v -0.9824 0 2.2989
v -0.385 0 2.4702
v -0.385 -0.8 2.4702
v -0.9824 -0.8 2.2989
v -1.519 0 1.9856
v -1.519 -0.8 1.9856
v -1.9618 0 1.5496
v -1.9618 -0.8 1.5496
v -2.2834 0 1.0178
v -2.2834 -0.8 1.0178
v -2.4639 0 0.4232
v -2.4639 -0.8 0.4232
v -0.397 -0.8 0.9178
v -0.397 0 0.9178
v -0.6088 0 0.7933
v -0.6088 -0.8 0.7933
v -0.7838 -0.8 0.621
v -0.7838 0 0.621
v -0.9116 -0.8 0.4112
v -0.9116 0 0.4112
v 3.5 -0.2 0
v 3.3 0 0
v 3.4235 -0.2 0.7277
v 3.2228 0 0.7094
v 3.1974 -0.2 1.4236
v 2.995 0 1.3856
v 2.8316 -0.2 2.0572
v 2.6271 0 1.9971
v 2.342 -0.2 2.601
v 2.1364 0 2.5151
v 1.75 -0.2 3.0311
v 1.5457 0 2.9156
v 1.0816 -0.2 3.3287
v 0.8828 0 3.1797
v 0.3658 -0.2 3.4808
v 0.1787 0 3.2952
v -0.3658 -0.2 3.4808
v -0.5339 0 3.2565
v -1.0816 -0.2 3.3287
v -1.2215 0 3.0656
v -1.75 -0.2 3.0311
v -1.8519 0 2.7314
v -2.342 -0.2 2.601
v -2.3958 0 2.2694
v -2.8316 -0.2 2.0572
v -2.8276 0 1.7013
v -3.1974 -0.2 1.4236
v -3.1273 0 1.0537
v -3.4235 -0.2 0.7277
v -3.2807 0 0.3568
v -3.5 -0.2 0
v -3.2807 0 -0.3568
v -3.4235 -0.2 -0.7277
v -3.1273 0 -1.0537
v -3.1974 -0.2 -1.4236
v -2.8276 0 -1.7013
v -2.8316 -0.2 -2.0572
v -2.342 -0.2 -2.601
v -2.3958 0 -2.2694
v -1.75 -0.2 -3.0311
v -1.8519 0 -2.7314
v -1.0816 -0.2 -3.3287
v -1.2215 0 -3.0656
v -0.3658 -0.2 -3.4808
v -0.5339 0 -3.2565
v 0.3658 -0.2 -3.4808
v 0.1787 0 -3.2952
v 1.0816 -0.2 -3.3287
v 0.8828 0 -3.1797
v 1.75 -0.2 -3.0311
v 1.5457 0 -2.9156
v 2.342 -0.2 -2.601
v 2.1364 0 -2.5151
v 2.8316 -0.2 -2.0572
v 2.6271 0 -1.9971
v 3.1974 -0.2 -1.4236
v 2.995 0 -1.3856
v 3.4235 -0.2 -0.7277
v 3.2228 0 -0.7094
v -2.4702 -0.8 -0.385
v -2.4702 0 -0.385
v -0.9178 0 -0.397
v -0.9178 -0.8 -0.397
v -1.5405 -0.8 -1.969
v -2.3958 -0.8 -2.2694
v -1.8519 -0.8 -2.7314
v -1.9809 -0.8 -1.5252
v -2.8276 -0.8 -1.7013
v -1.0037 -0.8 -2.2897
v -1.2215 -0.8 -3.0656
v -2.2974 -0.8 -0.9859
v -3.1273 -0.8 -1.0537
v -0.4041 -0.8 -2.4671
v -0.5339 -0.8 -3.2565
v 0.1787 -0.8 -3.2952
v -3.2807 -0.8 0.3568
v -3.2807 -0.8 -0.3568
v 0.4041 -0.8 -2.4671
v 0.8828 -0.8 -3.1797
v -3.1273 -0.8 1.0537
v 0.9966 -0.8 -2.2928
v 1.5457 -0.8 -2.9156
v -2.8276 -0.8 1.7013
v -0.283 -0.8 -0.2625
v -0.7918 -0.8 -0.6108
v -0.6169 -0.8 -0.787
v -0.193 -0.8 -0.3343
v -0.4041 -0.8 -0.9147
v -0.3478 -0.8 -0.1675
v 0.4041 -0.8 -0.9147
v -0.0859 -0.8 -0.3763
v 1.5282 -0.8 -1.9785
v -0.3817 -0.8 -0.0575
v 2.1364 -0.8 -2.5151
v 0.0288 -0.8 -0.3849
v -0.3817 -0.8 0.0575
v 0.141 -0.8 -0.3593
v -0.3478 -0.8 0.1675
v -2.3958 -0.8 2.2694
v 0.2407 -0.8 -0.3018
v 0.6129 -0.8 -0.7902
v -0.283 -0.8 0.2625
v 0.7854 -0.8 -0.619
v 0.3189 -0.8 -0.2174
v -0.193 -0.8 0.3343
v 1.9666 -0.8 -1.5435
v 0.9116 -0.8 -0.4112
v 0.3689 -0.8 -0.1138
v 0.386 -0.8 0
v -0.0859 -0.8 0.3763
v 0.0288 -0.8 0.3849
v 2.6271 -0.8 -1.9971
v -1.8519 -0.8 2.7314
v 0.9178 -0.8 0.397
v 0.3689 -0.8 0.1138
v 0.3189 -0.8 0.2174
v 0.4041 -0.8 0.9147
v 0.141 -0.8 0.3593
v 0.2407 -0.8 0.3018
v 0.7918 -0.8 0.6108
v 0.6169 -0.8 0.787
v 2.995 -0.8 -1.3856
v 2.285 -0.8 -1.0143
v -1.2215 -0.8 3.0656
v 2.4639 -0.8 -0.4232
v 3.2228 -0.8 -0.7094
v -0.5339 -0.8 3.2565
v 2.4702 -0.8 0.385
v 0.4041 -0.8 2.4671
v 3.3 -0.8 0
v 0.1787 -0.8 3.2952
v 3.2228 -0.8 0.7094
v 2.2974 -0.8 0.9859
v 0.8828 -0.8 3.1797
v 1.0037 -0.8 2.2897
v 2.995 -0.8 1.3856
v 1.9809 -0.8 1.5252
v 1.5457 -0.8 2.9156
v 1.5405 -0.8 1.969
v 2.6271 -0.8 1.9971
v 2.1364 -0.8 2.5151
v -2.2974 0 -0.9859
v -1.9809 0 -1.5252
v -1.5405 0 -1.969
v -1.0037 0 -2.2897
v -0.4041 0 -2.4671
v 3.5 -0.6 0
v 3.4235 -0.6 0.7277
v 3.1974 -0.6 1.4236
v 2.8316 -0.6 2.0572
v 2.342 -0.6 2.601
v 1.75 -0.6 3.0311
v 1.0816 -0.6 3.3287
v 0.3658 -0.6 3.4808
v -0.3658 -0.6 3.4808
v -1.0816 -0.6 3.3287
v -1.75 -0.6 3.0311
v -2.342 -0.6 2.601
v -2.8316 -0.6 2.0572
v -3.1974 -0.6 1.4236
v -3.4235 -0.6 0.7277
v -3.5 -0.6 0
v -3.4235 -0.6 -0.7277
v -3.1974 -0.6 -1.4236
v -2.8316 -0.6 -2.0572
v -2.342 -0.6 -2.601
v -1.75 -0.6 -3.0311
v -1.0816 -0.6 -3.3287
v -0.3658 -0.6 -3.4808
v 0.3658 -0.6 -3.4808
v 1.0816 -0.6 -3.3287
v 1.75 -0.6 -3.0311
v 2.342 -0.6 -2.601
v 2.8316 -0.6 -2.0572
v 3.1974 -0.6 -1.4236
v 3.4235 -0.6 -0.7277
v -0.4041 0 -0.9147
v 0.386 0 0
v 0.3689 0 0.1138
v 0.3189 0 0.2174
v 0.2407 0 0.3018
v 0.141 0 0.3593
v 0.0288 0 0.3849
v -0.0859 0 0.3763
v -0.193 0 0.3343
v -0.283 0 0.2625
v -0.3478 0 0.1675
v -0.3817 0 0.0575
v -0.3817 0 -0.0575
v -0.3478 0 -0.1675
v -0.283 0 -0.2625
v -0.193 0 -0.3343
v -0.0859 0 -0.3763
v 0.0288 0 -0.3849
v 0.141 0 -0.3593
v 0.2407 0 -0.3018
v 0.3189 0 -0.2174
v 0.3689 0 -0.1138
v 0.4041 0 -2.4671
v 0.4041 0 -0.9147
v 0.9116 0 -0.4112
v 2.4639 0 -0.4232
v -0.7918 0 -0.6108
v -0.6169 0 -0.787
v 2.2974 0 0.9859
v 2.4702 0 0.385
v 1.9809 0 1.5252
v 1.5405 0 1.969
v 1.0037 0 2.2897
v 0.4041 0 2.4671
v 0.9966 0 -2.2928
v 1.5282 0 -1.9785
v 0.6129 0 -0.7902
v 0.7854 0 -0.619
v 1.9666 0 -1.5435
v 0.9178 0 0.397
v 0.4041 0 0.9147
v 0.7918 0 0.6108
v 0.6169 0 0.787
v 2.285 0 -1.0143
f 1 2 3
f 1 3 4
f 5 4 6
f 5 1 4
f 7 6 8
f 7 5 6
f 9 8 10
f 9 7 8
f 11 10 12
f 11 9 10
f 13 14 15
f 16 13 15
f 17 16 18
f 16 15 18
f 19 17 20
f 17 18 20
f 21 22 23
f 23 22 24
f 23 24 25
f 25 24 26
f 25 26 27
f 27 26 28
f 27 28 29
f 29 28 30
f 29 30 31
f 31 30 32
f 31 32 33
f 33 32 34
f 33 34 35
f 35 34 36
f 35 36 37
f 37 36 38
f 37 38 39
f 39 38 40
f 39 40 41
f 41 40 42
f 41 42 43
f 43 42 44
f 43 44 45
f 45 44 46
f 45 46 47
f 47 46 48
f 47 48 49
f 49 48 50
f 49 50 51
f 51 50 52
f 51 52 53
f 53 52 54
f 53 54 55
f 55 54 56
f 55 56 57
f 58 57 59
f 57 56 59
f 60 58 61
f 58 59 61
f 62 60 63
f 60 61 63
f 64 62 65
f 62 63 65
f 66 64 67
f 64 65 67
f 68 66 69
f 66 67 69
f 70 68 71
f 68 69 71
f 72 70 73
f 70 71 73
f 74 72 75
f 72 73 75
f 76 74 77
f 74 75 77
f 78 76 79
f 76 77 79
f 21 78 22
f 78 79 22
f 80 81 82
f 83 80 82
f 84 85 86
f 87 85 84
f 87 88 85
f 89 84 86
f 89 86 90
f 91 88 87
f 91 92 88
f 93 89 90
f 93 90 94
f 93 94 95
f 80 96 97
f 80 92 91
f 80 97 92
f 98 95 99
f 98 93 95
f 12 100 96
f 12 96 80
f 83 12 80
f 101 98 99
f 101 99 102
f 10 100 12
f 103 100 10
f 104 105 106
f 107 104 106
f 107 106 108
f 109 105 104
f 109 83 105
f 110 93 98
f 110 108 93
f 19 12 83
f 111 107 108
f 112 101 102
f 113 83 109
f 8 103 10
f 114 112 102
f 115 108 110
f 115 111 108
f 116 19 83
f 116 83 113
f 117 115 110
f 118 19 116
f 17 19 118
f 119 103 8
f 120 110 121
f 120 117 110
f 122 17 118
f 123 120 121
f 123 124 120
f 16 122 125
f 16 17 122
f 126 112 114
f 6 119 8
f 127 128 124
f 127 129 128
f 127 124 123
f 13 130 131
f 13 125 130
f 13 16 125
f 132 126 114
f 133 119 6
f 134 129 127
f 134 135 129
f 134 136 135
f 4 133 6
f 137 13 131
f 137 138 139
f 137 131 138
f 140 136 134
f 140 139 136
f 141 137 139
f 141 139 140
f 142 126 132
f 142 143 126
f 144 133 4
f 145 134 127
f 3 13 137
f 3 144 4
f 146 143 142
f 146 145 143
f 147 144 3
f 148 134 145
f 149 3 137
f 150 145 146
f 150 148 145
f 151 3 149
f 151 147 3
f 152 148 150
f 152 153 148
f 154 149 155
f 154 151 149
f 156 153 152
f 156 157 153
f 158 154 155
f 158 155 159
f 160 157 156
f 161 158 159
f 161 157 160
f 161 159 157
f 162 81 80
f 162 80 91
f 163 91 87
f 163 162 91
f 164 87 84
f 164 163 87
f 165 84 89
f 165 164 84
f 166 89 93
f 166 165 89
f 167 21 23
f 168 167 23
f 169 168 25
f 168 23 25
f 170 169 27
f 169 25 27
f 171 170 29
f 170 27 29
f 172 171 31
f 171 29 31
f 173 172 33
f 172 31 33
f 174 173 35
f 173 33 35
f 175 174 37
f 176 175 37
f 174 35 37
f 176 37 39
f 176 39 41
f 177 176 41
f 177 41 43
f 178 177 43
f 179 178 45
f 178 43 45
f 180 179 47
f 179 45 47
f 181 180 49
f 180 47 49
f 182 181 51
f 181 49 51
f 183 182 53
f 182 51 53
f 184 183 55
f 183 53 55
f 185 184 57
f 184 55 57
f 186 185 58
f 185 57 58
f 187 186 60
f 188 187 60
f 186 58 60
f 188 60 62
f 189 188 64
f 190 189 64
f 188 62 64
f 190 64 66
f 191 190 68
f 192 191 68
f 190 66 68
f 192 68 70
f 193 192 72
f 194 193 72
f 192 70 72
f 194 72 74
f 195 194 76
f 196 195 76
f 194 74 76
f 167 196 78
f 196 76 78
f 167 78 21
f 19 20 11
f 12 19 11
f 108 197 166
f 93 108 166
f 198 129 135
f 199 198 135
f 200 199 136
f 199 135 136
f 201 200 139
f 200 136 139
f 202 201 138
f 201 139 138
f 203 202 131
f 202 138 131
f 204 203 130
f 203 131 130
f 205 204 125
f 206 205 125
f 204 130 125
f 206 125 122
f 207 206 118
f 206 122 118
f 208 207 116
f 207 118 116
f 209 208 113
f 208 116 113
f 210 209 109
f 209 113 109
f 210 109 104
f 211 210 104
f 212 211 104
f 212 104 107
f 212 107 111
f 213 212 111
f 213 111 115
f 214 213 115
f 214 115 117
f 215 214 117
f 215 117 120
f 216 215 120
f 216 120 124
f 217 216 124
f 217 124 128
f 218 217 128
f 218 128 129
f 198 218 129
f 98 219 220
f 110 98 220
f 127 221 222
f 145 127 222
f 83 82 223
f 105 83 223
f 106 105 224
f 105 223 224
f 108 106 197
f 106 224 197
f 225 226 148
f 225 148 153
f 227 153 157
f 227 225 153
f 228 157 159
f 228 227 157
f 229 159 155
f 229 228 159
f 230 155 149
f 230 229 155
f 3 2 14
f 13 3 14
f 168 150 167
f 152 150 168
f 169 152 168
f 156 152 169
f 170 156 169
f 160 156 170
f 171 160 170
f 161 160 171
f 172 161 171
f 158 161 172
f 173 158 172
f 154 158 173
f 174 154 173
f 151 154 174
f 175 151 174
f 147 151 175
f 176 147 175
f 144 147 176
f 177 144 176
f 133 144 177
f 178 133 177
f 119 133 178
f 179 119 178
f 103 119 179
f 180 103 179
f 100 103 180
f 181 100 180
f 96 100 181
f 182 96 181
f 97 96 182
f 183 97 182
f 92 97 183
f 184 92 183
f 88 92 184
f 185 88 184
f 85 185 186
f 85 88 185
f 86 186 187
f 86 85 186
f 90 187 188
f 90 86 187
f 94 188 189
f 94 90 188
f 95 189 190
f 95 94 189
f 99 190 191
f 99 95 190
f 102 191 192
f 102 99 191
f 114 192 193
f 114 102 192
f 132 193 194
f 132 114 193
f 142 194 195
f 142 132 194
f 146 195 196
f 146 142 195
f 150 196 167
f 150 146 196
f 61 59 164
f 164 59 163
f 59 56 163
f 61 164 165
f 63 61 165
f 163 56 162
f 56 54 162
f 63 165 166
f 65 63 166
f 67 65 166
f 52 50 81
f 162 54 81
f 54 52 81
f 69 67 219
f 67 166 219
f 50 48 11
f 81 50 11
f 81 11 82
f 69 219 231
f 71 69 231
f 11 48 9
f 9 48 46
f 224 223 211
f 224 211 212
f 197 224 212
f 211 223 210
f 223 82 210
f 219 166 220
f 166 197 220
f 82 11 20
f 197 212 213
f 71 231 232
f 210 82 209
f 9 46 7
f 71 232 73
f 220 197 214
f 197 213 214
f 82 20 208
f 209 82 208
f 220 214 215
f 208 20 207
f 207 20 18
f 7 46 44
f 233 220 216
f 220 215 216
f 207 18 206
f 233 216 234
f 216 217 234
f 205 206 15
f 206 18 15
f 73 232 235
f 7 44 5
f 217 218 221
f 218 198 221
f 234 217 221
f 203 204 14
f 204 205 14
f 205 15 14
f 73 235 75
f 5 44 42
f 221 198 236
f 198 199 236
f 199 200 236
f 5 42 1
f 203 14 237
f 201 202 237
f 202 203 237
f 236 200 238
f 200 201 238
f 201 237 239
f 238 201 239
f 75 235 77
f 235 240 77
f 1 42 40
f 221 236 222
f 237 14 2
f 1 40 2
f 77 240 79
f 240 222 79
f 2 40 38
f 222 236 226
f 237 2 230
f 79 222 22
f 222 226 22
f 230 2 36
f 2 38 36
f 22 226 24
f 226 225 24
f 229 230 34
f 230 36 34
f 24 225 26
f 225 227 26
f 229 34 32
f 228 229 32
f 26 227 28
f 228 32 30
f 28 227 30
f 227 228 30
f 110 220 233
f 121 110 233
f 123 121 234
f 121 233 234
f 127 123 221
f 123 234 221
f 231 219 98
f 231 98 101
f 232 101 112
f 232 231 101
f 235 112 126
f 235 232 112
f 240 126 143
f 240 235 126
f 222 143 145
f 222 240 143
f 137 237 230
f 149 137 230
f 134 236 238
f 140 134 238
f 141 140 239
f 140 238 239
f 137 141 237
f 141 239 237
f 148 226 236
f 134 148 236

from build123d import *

# Parameters (mm, degrees)
F0_R     = 3.5
F0_R_2   = 2.5
F1_DEPTH = 0.8
F2_SIZE  = 0.2
F4_DEPTH = 0.8
F6_R     = 0.386
F7_DEPTH = 25


with BuildPart() as f1:
    # F0 (on Front) → F1 (new body)
    with BuildSketch(Plane.XZ):
        Circle(F0_R)
        Circle(F0_R_2, mode=Mode.SUBTRACT)
    extrude(amount=F1_DEPTH)

    # F2
    f2_edges = [f1.edges().sort_by_distance(p)[0] for p in [
        (3.5, -0.4, 0),
        (-3.5, 0, 0),
        (-3.5, -0.8, 0),
    ]]
    chamfer(f2_edges, length=F2_SIZE)

    # F3 (on Front) → F4 (join)
    with BuildSketch(Plane.XZ):
        with BuildLine():
            Line((0.4040931107, -2.4671256064), (0.4040931107, -0.914717857))
            ThreePointArc((0.4040931107, -0.914717857), (0.7043653121, -0.7098376625), (0.9115631819, -0.411160024))
            Line((0.9115631819, -0.411160024), (2.463924442, -0.4231741297))
            ThreePointArc((2.463924442, -0.4231741297), (2.4909647835, -0.2123545325), (2.5, 0))
            ThreePointArc((2.5, 0), (2.4925336023, 0.1930705612), (2.4701790067, 0.3849878892))
            Line((2.4701790067, 0.3849878892), (0.9178177466, 0.3970019949))
            ThreePointArc((0.9178177466, 0.3970019949), (0.7098376625, 0.7043653121), (0.4040931107, 0.914717857))
            Line((0.4040931107, 0.914717857), (0.4040931107, 2.4671256064))
            ThreePointArc((0.4040931107, 2.4671256064), (0.0096738403, 2.4999812833), (-0.3849878892, 2.4701790067))
            Line((-0.3849878892, 2.4701790067), (-0.3970019949, 0.9178177466))
            ThreePointArc((-0.3970019949, 0.9178177466), (-0.7016132963, 0.7125579152), (-0.9115631819, 0.411160024))
            Line((-0.9115631819, 0.411160024), (-2.463924442, 0.4231741297))
            ThreePointArc((-2.463924442, 0.4231741297), (-2.4999251335, 0.0193475357), (-2.4701790067, -0.3849878892))
            Line((-2.4701790067, -0.3849878892), (-0.9178177466, -0.3970019949))
            ThreePointArc((-0.9178177466, -0.3970019949), (-0.7098376625, -0.7043653121), (-0.4040931107, -0.914717857))
            Line((-0.4040931107, -0.914717857), (-0.4040931107, -2.4671256064))
            ThreePointArc((-0.4040931107, -2.4671256064), (0, -2.5), (0.4040931107, -2.4671256064))
        make_face()
    extrude(amount=F4_DEPTH)

    # F6 (on face) → F7 (cut)
    with BuildSketch(Plane.XZ.offset(0.8)):
        Circle(F6_R)
    extrude(amount=-F7_DEPTH, mode=Mode.SUBTRACT)


solid = f1.part
